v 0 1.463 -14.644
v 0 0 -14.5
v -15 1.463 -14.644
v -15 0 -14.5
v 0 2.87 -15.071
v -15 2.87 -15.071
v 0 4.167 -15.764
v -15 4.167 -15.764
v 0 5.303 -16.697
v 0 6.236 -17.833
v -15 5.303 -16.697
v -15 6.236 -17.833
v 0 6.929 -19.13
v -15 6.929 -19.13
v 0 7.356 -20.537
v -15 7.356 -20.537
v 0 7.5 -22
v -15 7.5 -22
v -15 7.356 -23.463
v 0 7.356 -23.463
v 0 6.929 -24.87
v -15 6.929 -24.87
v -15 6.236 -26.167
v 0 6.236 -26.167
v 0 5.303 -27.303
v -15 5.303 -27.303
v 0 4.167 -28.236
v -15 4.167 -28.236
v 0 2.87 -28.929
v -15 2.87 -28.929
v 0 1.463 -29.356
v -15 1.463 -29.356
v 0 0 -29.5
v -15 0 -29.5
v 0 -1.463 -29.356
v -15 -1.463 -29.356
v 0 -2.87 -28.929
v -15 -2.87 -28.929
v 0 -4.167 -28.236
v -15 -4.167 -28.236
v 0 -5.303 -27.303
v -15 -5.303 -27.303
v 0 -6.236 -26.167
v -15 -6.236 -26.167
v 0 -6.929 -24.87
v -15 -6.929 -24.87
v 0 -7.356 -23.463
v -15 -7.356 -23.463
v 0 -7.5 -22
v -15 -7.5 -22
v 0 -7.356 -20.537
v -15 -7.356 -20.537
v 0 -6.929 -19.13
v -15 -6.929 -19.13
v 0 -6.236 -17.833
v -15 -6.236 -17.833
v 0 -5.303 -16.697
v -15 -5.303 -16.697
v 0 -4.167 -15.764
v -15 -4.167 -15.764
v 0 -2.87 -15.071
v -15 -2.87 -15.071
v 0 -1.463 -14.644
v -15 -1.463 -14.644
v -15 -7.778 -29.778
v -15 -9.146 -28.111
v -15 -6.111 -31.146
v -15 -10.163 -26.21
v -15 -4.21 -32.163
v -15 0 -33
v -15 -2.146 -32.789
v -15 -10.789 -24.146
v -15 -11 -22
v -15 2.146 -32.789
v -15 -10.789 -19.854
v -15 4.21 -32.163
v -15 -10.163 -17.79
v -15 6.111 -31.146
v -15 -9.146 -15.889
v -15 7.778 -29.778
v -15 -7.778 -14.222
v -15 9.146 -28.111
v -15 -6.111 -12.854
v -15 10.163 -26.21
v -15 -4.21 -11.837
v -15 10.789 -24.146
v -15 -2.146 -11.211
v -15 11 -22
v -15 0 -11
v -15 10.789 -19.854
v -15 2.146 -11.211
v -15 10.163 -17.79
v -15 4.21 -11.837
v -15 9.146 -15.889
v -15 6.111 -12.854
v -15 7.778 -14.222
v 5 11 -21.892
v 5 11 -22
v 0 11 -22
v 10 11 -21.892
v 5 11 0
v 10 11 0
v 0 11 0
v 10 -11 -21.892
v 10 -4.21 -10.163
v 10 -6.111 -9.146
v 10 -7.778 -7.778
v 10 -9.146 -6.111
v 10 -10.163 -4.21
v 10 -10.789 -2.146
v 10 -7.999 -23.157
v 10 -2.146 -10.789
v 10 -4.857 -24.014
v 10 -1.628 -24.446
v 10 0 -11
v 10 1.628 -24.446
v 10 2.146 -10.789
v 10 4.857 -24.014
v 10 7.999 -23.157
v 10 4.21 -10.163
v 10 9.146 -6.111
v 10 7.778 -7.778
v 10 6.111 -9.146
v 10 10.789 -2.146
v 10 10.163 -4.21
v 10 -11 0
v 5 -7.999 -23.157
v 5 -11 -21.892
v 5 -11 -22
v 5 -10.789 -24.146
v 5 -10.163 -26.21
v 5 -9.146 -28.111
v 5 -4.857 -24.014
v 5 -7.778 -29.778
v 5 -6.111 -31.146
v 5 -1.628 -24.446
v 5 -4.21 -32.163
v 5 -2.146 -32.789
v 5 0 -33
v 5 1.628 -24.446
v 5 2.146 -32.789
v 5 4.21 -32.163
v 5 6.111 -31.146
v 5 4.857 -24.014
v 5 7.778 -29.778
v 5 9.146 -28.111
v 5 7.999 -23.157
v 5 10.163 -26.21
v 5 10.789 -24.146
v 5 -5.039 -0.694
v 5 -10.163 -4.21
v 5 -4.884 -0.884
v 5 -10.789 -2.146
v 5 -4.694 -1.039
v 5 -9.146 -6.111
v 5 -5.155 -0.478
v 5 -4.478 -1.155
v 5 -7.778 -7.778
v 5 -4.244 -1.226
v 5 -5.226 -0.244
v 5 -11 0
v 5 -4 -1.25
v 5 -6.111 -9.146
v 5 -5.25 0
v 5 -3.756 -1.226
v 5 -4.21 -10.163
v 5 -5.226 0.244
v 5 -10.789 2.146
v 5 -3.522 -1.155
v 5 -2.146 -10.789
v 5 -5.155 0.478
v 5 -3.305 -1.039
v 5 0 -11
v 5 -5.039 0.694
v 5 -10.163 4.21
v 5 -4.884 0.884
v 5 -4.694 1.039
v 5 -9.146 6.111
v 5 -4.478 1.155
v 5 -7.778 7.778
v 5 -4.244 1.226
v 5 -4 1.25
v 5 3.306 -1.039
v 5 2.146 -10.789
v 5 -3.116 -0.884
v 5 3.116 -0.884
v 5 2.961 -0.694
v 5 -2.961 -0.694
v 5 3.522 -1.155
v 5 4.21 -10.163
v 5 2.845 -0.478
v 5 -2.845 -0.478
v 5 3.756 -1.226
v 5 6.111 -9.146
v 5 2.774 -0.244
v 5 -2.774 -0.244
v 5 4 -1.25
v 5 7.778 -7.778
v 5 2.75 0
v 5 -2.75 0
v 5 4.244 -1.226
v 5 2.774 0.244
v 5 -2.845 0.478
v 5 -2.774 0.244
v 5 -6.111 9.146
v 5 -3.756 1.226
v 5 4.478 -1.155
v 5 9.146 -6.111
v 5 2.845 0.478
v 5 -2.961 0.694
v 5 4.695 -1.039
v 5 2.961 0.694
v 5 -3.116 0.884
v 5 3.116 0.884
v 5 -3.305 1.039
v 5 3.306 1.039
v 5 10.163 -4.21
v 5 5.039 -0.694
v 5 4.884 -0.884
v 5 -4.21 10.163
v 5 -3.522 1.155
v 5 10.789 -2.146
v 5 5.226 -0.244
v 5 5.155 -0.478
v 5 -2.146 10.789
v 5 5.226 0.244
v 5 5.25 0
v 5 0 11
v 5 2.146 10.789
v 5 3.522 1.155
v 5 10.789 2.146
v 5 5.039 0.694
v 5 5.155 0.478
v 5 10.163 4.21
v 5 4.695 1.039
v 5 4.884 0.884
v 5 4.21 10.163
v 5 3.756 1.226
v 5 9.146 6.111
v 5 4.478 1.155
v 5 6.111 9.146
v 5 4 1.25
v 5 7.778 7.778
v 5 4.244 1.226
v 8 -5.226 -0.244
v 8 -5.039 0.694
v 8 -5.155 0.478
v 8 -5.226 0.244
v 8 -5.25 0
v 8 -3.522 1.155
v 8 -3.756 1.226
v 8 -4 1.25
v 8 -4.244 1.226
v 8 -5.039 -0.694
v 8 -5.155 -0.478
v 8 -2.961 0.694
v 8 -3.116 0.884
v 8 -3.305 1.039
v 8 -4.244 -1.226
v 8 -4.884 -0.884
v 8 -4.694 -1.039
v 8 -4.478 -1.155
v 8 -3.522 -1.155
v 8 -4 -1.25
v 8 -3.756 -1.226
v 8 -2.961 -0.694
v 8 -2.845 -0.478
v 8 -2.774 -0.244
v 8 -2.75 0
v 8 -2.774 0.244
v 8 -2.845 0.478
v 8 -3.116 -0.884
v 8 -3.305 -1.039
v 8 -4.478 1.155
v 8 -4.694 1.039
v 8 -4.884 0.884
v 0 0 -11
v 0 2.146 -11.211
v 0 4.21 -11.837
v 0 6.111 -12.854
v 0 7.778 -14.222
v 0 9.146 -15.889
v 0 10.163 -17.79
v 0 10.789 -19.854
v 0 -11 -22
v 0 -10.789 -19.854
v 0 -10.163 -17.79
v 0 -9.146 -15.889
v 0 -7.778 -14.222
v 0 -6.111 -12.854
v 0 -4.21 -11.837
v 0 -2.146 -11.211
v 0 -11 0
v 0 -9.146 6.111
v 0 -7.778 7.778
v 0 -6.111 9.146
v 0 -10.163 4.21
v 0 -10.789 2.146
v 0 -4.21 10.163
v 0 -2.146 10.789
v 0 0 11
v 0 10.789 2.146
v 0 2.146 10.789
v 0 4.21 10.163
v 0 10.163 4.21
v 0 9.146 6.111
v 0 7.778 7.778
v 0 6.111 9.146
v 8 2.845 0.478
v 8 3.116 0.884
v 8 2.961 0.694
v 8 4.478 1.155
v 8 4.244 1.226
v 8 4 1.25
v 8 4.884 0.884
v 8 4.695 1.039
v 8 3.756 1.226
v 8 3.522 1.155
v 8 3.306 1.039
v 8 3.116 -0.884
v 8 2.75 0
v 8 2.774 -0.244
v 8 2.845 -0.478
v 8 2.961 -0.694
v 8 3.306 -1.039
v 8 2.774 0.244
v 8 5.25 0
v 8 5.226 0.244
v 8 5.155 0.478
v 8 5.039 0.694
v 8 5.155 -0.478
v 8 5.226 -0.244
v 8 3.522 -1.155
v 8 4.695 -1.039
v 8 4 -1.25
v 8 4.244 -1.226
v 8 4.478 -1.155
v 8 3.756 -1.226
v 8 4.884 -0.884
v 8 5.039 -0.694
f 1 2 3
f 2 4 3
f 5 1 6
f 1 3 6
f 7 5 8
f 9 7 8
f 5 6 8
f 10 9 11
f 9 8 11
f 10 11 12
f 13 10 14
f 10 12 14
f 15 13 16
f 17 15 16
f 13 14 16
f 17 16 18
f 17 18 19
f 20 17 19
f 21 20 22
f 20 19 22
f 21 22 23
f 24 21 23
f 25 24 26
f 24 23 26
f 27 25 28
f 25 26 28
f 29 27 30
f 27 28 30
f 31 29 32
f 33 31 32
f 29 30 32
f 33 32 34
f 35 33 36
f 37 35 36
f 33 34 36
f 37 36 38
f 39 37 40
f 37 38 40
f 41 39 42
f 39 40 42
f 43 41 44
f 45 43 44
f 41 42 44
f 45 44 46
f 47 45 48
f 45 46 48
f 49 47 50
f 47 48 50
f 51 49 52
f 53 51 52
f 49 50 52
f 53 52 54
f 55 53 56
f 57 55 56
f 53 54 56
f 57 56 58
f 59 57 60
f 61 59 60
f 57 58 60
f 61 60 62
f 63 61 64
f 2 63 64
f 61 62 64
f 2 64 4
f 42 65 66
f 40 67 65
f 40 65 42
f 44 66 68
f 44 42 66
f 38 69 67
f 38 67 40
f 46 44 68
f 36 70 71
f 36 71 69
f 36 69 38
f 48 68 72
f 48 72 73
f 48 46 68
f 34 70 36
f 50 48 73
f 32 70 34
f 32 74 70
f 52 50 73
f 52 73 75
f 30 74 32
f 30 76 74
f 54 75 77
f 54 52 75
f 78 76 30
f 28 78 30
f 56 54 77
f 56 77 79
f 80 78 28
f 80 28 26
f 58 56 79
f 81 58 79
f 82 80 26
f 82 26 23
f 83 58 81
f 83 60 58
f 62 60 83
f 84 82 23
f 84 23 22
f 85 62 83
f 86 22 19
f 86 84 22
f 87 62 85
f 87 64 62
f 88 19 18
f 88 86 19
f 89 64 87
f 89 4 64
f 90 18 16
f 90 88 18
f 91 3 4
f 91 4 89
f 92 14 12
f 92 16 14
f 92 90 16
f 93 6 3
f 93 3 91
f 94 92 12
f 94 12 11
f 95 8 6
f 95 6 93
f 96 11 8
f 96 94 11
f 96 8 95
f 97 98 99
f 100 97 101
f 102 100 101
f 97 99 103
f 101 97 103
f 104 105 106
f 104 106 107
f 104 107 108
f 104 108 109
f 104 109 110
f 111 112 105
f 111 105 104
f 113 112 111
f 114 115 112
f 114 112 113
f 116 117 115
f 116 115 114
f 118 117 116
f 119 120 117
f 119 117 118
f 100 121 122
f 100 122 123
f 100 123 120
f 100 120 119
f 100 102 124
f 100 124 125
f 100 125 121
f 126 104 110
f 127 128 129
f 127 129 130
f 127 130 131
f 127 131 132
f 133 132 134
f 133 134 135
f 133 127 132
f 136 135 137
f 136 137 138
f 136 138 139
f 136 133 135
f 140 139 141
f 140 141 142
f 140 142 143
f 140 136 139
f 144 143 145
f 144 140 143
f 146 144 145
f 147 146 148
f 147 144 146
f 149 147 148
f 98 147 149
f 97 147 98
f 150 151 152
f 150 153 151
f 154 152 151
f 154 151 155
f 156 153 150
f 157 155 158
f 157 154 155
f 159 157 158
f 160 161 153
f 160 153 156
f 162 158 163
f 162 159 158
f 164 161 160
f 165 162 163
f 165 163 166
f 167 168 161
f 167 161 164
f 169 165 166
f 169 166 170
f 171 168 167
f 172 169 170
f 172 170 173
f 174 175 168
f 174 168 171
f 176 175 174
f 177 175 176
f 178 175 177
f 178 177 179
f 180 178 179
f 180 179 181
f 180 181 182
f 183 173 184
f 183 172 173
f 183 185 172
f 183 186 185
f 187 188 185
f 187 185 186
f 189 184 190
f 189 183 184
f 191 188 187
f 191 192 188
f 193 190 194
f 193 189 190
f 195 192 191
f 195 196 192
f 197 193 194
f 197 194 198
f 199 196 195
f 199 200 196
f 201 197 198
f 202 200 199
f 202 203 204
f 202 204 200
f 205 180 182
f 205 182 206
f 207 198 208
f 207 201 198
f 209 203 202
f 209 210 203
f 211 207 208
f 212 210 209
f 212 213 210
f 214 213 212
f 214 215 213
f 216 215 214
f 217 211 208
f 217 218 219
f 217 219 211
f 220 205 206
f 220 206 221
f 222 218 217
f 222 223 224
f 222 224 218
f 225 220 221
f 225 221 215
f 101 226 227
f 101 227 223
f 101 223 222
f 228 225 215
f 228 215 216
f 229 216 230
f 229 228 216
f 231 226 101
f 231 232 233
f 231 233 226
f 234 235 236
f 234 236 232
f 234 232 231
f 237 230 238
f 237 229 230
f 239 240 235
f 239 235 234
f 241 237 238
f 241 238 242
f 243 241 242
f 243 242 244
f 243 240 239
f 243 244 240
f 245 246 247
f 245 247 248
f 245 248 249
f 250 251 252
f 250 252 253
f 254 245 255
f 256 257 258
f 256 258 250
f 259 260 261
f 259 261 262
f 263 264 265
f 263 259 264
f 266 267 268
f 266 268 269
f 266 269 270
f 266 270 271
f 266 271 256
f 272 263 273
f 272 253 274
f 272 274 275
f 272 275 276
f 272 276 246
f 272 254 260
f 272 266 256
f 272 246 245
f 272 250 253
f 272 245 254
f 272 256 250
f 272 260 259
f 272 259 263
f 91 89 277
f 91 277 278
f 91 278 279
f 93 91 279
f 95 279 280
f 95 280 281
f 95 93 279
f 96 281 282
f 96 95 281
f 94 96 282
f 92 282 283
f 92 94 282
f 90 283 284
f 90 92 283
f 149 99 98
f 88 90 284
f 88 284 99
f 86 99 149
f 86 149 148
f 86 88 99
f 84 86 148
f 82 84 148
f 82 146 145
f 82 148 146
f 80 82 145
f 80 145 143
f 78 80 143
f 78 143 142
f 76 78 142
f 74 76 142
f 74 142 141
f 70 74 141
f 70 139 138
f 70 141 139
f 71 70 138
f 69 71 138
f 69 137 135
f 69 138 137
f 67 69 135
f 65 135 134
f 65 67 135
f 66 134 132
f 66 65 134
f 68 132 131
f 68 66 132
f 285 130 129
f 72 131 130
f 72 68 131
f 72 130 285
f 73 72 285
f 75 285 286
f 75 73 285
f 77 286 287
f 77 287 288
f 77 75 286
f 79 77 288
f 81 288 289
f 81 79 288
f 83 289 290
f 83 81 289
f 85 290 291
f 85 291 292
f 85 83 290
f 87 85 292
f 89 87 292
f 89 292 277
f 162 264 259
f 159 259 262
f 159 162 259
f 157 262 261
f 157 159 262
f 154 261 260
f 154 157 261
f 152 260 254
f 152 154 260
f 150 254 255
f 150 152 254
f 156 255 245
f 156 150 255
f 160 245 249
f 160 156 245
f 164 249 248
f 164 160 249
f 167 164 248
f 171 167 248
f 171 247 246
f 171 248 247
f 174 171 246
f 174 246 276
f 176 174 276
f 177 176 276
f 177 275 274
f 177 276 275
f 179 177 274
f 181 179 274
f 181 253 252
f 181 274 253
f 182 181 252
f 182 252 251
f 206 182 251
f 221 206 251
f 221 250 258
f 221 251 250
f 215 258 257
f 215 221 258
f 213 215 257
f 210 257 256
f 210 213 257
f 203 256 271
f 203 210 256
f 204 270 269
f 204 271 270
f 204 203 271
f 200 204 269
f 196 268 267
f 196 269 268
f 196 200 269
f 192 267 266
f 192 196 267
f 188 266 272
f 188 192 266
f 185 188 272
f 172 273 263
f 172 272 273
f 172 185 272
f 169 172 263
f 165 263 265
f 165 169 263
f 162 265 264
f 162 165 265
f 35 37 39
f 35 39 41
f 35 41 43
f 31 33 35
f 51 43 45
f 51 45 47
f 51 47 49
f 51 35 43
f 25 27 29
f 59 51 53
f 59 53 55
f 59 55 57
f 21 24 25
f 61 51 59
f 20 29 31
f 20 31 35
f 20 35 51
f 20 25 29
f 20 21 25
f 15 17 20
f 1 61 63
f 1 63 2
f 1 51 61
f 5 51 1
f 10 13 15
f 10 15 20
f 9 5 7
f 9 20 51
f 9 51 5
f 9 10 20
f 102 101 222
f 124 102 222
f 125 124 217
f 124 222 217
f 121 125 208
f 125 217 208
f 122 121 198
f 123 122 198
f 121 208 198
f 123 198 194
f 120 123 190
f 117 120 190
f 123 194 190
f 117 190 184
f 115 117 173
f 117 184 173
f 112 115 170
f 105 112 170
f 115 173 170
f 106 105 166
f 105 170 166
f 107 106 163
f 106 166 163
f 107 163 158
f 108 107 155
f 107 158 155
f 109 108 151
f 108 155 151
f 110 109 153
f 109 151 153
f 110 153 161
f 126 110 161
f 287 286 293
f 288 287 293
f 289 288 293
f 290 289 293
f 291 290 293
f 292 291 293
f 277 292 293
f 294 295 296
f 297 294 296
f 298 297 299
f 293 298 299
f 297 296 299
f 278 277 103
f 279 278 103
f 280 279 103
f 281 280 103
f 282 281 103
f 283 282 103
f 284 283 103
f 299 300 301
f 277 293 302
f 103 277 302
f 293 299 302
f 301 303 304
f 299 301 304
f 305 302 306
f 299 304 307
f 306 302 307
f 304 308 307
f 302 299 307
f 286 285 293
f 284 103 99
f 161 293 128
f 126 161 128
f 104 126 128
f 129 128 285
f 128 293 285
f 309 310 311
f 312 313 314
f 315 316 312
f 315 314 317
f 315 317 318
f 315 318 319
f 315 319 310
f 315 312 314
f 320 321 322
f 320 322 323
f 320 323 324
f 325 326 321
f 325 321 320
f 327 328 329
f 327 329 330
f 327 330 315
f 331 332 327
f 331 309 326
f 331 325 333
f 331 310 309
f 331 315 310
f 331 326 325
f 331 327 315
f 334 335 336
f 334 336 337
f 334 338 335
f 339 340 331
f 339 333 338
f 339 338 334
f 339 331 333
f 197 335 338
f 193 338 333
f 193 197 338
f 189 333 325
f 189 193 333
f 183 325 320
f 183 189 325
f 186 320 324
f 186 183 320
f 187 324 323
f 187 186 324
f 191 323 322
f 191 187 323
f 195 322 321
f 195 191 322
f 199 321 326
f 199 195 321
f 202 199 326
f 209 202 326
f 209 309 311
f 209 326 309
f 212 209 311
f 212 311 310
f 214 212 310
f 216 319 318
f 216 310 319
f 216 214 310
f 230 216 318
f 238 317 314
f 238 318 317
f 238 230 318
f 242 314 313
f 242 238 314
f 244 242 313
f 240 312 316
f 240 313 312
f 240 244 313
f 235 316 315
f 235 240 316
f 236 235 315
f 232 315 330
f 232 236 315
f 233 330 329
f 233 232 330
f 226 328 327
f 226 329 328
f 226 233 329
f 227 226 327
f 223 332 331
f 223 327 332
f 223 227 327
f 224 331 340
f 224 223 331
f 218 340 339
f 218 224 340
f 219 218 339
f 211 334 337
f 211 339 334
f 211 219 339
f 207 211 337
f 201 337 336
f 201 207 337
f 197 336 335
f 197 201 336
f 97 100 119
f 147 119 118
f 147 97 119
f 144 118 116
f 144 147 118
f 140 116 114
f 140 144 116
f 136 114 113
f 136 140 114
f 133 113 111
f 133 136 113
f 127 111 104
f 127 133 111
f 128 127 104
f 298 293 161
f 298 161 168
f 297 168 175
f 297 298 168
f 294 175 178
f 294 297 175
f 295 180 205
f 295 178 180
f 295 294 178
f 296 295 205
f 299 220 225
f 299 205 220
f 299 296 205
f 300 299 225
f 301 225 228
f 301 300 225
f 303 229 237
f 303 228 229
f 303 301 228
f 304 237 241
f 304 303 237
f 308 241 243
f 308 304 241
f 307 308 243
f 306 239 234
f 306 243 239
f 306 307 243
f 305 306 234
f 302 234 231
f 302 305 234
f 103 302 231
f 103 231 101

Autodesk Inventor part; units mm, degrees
ref_plane "YZ Plane" through (0, 0, 0) normal (1, 0, 0) x (0, 1, 0)
ref_plane "XZ Plane" through (0, 0, 0) normal (0, 1, 0) x (-1, 0, 0)
ref_plane "XY Plane" through (0, 0, 0) normal (0, 0, 1) x (1, 0, 0)
sketch "Sketch1" plane through (0, 0, 0) normal (1, 0, 0) x (0, 1, 0)
  circle A0 centre (4.0001, 0) radius 1.25
  circle A1 centre (-3.9999, 0) radius 1.25
  circle A2 centre (0, 0) radius 11
  line L0 (11, 0) -> (11, -22)
  line L1 (11, 0) -> (33, 0) construction
  line L2 (-11, 0) -> (-11, -22)
  line L3 (-11, 0) -> (11, 0) construction
  circle A3 centre (0, -22) radius 11
  circle A4 centre (0, -26.0001) radius 1.25
  circle A5 centre (0, -18.0001) radius 1.25
  point P0 (1.5875, 1.5875)
  dimension "d0" = 22
  dimension "d1" = 90
  dimension "d2" = 22
  dimension "d3" = 90
extrude "Extrusion1" add sketch "Sketch1" along normal blind 5
sketch "Sketch2" plane through (5, 0, 0) normal (1, 0, 0) x (0, 0, -1)
  arc A0 (0, 11) -> (0, -11) centre (0, 0) ccw projected
  line L0 (0, -11) -> (22, -11) projected
  arc A1 (22, -11) -> (22, 11) centre (22, 0) ccw projected
  line L1 (22, 11) -> (0, 11) projected
  circle A2 centre (18.0001, 0) radius 1.25 projected
  circle A3 centre (26.0001, 0) radius 1.25 projected
  circle A4 centre (0, -3.9999) radius 1.25 projected
  circle A5 centre (0, 4.0001) radius 1.25 projected
extrude "Extrusion2" add sketch "Sketch2" along normal blind 3 and the other way blind 5 contours A4 | A5
sketch "Sketch3" plane through (0, 0, 0) normal (-1, 0, 0) x (0, 0, 1)
  arc A0 (0, -11) -> (0, 11) centre (0, 0) ccw projected
  line L0 (0, -11) -> (-22, -11) projected
  arc A1 (-22, 11) -> (-22, -11) centre (-22, 0) ccw projected
  line L1 (-22, 11) -> (0, 11) projected
  circle A2 centre (-18.0001, 0) radius 1.25 projected
  circle A3 centre (-26.0001, 0) radius 1.25 projected
  circle A4 centre (0, -3.9999) radius 1.25 projected
  circle A5 centre (0, 4.0001) radius 1.25 projected
extrude "Extrusion3" add sketch "Sketch3" against normal blind 5 contours A2 | A3
sketch "Sketch4" plane through (0, 0, 0) normal (-1, 0, 0) x (0, 0, 1)
  line L0 (0, 0) -> (-22, 0)
  line L1 (0, 0) -> (22, 0) construction
  circle A0 centre (-22, 0) radius 11
  circle A1 centre (-22, 0) radius 9.5
  dimension "d12" = 22
  dimension "d13" = 180
  dimension "d14" = 22
  dimension "d15" = 19
extrude "Extrusion4" add sketch "Sketch4" along normal blind 15 contours A1 | A0
sketch "Sketch5" plane through (5, 0, 0) normal (1, 0, 0) x (0, 0, -1)
  circle A0 centre (0, 0) radius 24.5 projected
  circle A1 centre (-20, 0) radius 3.5 projected
  circle A2 centre (-14.1421, 14.1421) radius 2.675 projected
  circle A3 centre (-14.1421, -14.1421) radius 2.675 projected
  circle A4 centre (14.1421, -14.1421) radius 2.675 projected
  circle A5 centre (14.1421, 14.1421) radius 2.675 projected
  circle A6 centre (0, 0) radius 11 projected
  line L0 (0, -11) -> (22, -11) projected
  line L1 (22, 11) -> (0, 11) projected
  point P0 (0, 0)
  point P1 (21.8918, 11)
  point P2 (21.8918, -11)
extrude "Extrusion5" add sketch "Sketch5" along normal blind 5 contours A0 L0 A6 L1 picked at (19.9018, -1.2624)
sketch "Sketch6" plane through (-15, 0, -22) normal (-1, 0, 0) x (0, 0, 1)
  circle A0 centre (0, 0) radius 7.5
  point P0 (22, 0)
  dimension "d20" = 15
extrude "Extrusion6" cut sketch "Sketch6" against normal blind 15
properties part number "Herramienta Marcador Conector"
